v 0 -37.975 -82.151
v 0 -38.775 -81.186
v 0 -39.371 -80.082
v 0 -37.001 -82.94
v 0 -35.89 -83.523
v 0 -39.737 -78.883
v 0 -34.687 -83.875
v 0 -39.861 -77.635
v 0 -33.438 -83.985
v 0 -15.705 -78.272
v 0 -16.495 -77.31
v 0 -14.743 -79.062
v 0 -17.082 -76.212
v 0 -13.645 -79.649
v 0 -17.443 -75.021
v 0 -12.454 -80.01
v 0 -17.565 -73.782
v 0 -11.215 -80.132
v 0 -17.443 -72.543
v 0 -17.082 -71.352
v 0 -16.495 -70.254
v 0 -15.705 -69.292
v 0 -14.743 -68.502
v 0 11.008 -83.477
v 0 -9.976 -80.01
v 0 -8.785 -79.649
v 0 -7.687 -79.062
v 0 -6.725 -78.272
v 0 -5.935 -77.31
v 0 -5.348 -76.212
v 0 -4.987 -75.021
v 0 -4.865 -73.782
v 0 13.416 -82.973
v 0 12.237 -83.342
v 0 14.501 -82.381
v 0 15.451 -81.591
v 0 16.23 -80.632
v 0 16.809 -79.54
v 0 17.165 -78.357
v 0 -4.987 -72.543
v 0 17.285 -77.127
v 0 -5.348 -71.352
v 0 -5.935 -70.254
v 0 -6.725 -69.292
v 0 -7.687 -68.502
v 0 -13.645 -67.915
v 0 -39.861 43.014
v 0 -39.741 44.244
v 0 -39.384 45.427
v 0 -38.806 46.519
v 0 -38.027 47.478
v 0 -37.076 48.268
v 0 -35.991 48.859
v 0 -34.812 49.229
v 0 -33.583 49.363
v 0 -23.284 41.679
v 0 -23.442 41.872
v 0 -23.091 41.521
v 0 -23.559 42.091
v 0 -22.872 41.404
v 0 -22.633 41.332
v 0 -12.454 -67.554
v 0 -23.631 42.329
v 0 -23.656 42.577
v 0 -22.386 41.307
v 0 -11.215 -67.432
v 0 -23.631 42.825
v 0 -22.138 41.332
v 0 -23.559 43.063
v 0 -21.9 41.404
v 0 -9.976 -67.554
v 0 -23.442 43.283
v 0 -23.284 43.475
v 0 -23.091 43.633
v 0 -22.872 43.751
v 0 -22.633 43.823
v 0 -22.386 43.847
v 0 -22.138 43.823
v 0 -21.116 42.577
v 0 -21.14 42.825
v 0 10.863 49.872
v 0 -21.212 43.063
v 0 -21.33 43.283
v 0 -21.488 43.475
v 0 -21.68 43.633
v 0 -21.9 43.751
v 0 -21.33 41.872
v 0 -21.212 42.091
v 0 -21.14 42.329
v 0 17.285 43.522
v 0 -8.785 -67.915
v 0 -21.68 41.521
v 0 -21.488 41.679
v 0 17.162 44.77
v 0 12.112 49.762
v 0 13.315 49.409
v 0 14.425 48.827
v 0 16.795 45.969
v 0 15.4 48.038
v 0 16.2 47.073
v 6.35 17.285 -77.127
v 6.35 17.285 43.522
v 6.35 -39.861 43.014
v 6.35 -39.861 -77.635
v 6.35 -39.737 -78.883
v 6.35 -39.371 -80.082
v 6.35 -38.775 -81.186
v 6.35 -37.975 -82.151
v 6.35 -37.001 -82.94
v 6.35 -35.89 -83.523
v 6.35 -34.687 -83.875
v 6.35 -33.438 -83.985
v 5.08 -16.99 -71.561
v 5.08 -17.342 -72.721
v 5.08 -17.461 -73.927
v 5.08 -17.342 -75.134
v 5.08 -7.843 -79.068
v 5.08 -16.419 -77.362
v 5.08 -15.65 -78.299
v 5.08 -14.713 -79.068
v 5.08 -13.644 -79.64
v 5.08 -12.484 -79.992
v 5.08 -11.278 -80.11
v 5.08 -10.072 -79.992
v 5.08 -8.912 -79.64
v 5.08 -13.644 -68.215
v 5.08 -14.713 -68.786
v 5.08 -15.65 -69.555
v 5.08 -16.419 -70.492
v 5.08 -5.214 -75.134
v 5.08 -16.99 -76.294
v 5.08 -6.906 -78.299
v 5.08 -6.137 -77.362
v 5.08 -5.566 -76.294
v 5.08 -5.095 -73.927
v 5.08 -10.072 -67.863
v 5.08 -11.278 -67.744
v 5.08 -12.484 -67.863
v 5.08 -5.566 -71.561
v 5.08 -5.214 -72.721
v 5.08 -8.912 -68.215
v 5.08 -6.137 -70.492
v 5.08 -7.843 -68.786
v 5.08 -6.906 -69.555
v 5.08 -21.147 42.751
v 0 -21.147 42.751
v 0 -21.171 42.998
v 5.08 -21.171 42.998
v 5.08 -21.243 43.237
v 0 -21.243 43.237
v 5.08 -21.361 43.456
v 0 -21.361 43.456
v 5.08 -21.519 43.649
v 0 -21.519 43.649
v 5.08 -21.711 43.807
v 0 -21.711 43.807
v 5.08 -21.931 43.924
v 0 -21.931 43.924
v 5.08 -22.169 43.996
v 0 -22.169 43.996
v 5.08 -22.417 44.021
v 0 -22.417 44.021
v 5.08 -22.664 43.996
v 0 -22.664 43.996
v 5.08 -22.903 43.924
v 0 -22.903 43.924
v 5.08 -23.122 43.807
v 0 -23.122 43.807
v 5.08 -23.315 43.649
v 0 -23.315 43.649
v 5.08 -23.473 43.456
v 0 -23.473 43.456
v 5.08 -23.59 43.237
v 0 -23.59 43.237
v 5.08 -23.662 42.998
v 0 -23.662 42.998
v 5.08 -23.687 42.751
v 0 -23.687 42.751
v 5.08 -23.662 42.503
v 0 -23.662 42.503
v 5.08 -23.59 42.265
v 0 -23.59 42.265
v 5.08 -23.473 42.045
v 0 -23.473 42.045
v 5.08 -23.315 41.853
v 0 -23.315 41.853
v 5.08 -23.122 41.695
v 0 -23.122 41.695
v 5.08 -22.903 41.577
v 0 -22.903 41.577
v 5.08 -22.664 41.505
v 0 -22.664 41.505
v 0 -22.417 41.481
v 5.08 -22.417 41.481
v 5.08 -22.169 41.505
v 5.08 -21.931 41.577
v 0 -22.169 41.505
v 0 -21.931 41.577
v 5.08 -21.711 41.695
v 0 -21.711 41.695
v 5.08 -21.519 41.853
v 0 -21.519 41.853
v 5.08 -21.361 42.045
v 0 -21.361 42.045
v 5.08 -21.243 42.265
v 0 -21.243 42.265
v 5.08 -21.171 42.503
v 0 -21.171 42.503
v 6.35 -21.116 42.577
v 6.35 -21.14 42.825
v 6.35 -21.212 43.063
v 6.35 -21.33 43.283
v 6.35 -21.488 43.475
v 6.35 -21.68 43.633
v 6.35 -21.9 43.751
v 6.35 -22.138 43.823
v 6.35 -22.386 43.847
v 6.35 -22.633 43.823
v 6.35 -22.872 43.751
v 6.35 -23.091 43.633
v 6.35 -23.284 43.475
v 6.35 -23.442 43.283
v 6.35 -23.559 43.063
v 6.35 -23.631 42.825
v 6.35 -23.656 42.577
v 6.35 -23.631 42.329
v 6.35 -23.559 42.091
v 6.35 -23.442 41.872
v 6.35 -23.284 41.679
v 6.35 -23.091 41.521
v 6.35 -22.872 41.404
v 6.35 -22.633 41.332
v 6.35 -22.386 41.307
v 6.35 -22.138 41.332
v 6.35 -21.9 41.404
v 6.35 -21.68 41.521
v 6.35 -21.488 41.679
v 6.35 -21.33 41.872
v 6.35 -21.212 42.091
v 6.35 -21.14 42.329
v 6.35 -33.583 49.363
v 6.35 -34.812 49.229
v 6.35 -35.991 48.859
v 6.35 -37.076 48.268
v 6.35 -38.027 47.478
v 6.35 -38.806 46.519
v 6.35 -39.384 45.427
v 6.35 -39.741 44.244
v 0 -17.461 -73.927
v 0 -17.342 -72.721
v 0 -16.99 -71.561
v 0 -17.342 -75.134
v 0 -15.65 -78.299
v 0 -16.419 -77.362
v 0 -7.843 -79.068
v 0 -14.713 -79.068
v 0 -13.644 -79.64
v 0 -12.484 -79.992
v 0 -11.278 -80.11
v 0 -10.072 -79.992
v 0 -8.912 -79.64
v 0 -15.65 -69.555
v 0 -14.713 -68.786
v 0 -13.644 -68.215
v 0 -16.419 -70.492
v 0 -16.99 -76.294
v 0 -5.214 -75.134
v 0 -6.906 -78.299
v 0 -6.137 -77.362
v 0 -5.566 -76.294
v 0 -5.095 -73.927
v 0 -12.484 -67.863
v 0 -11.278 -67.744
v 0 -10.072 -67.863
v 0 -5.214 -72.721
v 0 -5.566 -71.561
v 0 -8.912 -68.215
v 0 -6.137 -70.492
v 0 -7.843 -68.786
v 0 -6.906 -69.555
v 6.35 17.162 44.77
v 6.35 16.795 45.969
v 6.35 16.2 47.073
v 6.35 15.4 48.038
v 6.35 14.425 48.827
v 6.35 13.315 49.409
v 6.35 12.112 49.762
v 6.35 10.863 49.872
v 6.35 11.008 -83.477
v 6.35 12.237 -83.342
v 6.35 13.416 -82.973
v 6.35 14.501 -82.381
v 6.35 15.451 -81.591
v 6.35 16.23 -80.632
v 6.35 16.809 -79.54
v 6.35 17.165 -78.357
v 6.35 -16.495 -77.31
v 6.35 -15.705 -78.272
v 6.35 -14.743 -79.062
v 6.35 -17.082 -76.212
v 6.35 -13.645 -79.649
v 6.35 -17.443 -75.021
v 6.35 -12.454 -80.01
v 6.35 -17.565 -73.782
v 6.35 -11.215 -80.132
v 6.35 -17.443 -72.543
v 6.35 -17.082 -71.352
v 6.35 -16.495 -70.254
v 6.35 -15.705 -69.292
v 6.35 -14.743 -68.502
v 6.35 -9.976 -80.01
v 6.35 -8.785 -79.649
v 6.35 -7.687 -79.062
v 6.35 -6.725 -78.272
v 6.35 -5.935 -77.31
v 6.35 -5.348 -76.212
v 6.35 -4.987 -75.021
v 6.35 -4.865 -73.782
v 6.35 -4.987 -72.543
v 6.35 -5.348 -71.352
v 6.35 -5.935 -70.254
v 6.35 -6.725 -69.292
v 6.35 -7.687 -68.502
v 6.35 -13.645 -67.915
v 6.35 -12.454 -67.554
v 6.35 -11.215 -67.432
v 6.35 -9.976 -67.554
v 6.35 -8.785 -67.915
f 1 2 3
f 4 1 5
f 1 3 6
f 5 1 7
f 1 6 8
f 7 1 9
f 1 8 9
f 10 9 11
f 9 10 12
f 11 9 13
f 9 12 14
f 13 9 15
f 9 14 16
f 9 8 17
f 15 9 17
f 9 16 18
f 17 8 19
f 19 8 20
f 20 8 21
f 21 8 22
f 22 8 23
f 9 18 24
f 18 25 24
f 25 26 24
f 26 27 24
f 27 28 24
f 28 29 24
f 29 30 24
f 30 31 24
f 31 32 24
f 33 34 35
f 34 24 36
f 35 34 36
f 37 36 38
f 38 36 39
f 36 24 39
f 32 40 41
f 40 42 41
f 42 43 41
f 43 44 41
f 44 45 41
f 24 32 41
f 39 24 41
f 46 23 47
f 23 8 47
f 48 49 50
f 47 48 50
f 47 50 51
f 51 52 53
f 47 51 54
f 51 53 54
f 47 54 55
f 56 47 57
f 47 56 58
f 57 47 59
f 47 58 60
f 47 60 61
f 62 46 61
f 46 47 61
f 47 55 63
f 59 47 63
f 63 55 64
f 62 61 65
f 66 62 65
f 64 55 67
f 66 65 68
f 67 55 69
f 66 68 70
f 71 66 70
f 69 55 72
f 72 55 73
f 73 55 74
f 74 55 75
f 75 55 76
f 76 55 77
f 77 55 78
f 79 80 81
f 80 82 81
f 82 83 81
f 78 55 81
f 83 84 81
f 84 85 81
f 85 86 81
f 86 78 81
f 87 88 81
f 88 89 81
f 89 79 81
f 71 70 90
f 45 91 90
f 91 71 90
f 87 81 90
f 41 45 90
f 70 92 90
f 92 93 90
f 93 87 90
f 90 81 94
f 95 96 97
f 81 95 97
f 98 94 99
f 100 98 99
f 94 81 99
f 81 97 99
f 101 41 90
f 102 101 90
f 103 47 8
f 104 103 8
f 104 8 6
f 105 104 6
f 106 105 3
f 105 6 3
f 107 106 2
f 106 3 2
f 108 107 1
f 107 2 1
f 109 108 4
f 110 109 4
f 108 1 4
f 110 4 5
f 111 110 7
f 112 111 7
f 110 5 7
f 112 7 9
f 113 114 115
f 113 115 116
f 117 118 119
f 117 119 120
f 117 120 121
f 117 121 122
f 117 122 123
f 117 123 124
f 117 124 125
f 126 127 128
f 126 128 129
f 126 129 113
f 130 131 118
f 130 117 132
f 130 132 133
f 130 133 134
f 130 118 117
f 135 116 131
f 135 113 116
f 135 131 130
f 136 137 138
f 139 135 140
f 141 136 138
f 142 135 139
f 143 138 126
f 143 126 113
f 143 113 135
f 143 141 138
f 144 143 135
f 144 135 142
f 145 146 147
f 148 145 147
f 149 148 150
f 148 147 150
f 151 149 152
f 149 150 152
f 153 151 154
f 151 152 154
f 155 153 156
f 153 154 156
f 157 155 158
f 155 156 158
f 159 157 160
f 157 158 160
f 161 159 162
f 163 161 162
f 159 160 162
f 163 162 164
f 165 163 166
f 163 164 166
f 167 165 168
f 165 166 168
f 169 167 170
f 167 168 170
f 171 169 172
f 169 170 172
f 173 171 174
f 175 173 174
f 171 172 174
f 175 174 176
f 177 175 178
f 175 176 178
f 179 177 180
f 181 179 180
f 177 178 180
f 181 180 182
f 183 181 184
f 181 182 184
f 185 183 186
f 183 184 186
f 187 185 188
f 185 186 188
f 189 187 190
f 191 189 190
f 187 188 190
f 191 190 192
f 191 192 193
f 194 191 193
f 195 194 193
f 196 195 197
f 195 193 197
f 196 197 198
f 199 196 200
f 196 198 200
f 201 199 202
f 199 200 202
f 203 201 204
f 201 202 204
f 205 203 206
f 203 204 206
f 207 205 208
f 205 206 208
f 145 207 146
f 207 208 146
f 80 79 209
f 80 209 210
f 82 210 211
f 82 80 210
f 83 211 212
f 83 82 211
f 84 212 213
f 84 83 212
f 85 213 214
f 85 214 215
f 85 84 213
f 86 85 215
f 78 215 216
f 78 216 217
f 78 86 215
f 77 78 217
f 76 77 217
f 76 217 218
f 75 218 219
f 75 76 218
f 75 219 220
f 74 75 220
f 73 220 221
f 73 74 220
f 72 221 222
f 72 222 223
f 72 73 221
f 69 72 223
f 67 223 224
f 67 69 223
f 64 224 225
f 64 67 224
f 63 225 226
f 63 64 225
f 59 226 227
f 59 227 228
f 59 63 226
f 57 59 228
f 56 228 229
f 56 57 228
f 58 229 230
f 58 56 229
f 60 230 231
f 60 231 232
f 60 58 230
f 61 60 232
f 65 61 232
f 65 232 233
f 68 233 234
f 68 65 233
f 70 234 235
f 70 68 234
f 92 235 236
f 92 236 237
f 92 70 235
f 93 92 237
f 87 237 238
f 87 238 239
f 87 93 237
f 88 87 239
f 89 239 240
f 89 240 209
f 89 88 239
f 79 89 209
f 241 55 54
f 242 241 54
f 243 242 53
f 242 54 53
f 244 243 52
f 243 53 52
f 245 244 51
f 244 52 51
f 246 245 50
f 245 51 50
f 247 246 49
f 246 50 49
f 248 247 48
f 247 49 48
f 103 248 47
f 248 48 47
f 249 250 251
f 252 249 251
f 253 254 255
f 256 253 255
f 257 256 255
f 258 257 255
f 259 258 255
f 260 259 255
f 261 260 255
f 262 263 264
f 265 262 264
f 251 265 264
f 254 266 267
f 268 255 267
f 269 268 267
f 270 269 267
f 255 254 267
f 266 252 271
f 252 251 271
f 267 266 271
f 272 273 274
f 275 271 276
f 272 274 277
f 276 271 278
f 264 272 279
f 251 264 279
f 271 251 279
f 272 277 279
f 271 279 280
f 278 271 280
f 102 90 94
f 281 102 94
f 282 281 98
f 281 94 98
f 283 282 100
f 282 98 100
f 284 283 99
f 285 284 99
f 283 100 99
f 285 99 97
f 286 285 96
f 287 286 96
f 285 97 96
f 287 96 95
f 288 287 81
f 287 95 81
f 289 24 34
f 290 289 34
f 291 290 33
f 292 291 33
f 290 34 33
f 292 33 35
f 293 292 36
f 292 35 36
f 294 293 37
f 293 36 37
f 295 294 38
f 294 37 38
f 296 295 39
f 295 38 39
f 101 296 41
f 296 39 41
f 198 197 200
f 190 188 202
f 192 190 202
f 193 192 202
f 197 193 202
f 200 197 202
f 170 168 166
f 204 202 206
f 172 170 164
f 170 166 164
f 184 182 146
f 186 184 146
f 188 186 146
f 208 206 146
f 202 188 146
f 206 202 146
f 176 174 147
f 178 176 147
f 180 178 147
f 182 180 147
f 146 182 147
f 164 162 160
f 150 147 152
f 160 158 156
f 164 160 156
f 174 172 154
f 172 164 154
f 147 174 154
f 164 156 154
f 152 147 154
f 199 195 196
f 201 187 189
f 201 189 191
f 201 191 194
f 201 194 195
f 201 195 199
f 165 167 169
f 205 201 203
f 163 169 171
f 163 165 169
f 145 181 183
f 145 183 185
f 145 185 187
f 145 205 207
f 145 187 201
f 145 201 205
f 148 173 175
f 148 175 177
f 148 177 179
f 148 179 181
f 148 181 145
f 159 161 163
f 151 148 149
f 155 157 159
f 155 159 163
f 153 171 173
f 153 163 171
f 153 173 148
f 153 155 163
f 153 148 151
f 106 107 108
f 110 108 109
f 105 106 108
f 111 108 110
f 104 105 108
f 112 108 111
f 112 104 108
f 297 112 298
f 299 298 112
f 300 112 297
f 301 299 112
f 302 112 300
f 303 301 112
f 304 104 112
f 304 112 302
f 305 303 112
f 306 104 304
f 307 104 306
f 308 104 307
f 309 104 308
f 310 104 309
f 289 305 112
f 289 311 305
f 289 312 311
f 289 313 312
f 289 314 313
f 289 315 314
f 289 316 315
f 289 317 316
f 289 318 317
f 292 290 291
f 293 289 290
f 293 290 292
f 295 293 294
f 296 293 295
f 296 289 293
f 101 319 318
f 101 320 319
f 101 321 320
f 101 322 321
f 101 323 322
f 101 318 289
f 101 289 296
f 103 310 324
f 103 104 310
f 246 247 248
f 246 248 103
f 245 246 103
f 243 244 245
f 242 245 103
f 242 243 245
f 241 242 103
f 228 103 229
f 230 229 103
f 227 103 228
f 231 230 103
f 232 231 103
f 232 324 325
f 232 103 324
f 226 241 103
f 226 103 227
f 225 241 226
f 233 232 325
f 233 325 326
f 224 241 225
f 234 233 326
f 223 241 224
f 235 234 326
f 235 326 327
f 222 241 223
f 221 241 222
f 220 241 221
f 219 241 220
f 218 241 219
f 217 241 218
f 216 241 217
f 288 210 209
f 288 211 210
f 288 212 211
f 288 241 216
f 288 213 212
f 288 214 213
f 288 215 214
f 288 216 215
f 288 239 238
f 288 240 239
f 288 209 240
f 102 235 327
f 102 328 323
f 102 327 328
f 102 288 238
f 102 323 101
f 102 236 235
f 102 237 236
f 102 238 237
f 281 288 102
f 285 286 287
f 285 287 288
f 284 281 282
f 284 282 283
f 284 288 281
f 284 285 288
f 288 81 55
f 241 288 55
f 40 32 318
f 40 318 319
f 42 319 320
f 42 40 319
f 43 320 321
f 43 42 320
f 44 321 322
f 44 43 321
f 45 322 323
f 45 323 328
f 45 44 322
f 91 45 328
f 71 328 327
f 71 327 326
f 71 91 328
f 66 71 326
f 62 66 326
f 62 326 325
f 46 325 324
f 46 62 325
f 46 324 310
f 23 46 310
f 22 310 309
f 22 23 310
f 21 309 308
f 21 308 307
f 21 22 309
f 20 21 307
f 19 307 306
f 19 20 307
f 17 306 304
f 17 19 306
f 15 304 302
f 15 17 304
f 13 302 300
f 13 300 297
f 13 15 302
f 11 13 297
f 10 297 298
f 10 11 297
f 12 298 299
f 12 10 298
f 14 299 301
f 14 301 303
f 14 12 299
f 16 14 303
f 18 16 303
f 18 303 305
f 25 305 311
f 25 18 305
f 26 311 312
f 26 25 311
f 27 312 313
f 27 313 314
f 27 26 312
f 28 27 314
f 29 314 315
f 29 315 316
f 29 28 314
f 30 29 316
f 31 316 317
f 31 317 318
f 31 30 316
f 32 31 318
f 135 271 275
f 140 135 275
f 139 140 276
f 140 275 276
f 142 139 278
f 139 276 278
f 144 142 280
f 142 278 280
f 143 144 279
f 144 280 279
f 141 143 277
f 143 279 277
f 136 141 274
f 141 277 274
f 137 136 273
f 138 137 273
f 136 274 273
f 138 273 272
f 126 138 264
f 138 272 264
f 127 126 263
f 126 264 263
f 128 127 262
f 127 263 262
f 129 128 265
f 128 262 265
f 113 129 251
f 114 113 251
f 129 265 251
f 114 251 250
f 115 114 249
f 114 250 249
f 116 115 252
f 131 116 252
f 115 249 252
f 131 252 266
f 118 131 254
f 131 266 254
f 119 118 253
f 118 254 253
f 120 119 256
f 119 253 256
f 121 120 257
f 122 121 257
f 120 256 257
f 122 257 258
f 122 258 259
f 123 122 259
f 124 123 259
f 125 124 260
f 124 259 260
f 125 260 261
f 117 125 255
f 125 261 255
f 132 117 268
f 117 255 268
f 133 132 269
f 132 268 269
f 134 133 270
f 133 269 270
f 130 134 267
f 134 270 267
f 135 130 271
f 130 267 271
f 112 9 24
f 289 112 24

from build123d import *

# Parameters (mm, degrees)
F0_R     = 6.35
F0_R_2   = 1.27
F1_DEPTH = 6.35
F2_R     = 6.1829946026
F3_DEPTH = 5.08
F2_R_2   = 1.27


# Not quite as in the source:
# - a feature of the source that left no trace in its solid (it failed there, or was rolled back) is left out


with BuildPart() as f1:
    # F0 (on Right) → F1 (new body)
    with BuildSketch(Plane.YZ):
        with BuildLine():
            Line((17.2854172051, -77.1269578294), (17.2854172051, 43.5222112587))
            ThreePointArc((17.2854172051, 43.5222112587), (15.3997912282, 48.0379464793), (10.8627826911, 49.87179583))
            Line((10.8627826911, 49.87179583), (-33.5834784501, 49.3633637362))
            ThreePointArc((-33.5834784501, 49.3633637362), (-38.0265791567, 47.4781531881), (-39.8608439361, 43.013779165))
            Line((-39.8608439361, 43.013779165), (-39.8608439361, -77.6353899231))
            ThreePointArc((-39.8608439361, -77.6353899231), (-37.9752179592, -82.1511251437), (-33.4382094221, -83.9849744944))
            Line((-33.4382094221, -83.9849744944), (11.0080517191, -83.4765424006))
            ThreePointArc((11.0080517191, -83.4765424006), (15.4511524256, -81.5913318525), (17.2854172051, -77.1269578294))
        make_face()
        with Locations((-11.2150788515, -73.7819895148)):
            Circle(F0_R, mode=Mode.SUBTRACT)
        with Locations((-22.3856065422, 42.5772145391)):
            Circle(F0_R_2, mode=Mode.SUBTRACT)
    extrude(amount=F1_DEPTH)


with BuildPart() as f3:
    # F2 (on Right) → F3 (new body)
    with BuildSketch(Plane.YZ):
        with Locations((-11.2779513001, -73.9273875952)):
            Circle(F2_R)
    extrude(amount=F3_DEPTH)


with BuildPart() as f3b:
    # F2 (on Right) → F3, piece 2 (new body)
    with BuildSketch(Plane.YZ):
        with Locations((-22.4166736007, 42.7506938577)):
            Circle(F2_R_2)
    extrude(amount=F3_DEPTH)


solid = Compound([f1.part, f3.part, f3b.part])
